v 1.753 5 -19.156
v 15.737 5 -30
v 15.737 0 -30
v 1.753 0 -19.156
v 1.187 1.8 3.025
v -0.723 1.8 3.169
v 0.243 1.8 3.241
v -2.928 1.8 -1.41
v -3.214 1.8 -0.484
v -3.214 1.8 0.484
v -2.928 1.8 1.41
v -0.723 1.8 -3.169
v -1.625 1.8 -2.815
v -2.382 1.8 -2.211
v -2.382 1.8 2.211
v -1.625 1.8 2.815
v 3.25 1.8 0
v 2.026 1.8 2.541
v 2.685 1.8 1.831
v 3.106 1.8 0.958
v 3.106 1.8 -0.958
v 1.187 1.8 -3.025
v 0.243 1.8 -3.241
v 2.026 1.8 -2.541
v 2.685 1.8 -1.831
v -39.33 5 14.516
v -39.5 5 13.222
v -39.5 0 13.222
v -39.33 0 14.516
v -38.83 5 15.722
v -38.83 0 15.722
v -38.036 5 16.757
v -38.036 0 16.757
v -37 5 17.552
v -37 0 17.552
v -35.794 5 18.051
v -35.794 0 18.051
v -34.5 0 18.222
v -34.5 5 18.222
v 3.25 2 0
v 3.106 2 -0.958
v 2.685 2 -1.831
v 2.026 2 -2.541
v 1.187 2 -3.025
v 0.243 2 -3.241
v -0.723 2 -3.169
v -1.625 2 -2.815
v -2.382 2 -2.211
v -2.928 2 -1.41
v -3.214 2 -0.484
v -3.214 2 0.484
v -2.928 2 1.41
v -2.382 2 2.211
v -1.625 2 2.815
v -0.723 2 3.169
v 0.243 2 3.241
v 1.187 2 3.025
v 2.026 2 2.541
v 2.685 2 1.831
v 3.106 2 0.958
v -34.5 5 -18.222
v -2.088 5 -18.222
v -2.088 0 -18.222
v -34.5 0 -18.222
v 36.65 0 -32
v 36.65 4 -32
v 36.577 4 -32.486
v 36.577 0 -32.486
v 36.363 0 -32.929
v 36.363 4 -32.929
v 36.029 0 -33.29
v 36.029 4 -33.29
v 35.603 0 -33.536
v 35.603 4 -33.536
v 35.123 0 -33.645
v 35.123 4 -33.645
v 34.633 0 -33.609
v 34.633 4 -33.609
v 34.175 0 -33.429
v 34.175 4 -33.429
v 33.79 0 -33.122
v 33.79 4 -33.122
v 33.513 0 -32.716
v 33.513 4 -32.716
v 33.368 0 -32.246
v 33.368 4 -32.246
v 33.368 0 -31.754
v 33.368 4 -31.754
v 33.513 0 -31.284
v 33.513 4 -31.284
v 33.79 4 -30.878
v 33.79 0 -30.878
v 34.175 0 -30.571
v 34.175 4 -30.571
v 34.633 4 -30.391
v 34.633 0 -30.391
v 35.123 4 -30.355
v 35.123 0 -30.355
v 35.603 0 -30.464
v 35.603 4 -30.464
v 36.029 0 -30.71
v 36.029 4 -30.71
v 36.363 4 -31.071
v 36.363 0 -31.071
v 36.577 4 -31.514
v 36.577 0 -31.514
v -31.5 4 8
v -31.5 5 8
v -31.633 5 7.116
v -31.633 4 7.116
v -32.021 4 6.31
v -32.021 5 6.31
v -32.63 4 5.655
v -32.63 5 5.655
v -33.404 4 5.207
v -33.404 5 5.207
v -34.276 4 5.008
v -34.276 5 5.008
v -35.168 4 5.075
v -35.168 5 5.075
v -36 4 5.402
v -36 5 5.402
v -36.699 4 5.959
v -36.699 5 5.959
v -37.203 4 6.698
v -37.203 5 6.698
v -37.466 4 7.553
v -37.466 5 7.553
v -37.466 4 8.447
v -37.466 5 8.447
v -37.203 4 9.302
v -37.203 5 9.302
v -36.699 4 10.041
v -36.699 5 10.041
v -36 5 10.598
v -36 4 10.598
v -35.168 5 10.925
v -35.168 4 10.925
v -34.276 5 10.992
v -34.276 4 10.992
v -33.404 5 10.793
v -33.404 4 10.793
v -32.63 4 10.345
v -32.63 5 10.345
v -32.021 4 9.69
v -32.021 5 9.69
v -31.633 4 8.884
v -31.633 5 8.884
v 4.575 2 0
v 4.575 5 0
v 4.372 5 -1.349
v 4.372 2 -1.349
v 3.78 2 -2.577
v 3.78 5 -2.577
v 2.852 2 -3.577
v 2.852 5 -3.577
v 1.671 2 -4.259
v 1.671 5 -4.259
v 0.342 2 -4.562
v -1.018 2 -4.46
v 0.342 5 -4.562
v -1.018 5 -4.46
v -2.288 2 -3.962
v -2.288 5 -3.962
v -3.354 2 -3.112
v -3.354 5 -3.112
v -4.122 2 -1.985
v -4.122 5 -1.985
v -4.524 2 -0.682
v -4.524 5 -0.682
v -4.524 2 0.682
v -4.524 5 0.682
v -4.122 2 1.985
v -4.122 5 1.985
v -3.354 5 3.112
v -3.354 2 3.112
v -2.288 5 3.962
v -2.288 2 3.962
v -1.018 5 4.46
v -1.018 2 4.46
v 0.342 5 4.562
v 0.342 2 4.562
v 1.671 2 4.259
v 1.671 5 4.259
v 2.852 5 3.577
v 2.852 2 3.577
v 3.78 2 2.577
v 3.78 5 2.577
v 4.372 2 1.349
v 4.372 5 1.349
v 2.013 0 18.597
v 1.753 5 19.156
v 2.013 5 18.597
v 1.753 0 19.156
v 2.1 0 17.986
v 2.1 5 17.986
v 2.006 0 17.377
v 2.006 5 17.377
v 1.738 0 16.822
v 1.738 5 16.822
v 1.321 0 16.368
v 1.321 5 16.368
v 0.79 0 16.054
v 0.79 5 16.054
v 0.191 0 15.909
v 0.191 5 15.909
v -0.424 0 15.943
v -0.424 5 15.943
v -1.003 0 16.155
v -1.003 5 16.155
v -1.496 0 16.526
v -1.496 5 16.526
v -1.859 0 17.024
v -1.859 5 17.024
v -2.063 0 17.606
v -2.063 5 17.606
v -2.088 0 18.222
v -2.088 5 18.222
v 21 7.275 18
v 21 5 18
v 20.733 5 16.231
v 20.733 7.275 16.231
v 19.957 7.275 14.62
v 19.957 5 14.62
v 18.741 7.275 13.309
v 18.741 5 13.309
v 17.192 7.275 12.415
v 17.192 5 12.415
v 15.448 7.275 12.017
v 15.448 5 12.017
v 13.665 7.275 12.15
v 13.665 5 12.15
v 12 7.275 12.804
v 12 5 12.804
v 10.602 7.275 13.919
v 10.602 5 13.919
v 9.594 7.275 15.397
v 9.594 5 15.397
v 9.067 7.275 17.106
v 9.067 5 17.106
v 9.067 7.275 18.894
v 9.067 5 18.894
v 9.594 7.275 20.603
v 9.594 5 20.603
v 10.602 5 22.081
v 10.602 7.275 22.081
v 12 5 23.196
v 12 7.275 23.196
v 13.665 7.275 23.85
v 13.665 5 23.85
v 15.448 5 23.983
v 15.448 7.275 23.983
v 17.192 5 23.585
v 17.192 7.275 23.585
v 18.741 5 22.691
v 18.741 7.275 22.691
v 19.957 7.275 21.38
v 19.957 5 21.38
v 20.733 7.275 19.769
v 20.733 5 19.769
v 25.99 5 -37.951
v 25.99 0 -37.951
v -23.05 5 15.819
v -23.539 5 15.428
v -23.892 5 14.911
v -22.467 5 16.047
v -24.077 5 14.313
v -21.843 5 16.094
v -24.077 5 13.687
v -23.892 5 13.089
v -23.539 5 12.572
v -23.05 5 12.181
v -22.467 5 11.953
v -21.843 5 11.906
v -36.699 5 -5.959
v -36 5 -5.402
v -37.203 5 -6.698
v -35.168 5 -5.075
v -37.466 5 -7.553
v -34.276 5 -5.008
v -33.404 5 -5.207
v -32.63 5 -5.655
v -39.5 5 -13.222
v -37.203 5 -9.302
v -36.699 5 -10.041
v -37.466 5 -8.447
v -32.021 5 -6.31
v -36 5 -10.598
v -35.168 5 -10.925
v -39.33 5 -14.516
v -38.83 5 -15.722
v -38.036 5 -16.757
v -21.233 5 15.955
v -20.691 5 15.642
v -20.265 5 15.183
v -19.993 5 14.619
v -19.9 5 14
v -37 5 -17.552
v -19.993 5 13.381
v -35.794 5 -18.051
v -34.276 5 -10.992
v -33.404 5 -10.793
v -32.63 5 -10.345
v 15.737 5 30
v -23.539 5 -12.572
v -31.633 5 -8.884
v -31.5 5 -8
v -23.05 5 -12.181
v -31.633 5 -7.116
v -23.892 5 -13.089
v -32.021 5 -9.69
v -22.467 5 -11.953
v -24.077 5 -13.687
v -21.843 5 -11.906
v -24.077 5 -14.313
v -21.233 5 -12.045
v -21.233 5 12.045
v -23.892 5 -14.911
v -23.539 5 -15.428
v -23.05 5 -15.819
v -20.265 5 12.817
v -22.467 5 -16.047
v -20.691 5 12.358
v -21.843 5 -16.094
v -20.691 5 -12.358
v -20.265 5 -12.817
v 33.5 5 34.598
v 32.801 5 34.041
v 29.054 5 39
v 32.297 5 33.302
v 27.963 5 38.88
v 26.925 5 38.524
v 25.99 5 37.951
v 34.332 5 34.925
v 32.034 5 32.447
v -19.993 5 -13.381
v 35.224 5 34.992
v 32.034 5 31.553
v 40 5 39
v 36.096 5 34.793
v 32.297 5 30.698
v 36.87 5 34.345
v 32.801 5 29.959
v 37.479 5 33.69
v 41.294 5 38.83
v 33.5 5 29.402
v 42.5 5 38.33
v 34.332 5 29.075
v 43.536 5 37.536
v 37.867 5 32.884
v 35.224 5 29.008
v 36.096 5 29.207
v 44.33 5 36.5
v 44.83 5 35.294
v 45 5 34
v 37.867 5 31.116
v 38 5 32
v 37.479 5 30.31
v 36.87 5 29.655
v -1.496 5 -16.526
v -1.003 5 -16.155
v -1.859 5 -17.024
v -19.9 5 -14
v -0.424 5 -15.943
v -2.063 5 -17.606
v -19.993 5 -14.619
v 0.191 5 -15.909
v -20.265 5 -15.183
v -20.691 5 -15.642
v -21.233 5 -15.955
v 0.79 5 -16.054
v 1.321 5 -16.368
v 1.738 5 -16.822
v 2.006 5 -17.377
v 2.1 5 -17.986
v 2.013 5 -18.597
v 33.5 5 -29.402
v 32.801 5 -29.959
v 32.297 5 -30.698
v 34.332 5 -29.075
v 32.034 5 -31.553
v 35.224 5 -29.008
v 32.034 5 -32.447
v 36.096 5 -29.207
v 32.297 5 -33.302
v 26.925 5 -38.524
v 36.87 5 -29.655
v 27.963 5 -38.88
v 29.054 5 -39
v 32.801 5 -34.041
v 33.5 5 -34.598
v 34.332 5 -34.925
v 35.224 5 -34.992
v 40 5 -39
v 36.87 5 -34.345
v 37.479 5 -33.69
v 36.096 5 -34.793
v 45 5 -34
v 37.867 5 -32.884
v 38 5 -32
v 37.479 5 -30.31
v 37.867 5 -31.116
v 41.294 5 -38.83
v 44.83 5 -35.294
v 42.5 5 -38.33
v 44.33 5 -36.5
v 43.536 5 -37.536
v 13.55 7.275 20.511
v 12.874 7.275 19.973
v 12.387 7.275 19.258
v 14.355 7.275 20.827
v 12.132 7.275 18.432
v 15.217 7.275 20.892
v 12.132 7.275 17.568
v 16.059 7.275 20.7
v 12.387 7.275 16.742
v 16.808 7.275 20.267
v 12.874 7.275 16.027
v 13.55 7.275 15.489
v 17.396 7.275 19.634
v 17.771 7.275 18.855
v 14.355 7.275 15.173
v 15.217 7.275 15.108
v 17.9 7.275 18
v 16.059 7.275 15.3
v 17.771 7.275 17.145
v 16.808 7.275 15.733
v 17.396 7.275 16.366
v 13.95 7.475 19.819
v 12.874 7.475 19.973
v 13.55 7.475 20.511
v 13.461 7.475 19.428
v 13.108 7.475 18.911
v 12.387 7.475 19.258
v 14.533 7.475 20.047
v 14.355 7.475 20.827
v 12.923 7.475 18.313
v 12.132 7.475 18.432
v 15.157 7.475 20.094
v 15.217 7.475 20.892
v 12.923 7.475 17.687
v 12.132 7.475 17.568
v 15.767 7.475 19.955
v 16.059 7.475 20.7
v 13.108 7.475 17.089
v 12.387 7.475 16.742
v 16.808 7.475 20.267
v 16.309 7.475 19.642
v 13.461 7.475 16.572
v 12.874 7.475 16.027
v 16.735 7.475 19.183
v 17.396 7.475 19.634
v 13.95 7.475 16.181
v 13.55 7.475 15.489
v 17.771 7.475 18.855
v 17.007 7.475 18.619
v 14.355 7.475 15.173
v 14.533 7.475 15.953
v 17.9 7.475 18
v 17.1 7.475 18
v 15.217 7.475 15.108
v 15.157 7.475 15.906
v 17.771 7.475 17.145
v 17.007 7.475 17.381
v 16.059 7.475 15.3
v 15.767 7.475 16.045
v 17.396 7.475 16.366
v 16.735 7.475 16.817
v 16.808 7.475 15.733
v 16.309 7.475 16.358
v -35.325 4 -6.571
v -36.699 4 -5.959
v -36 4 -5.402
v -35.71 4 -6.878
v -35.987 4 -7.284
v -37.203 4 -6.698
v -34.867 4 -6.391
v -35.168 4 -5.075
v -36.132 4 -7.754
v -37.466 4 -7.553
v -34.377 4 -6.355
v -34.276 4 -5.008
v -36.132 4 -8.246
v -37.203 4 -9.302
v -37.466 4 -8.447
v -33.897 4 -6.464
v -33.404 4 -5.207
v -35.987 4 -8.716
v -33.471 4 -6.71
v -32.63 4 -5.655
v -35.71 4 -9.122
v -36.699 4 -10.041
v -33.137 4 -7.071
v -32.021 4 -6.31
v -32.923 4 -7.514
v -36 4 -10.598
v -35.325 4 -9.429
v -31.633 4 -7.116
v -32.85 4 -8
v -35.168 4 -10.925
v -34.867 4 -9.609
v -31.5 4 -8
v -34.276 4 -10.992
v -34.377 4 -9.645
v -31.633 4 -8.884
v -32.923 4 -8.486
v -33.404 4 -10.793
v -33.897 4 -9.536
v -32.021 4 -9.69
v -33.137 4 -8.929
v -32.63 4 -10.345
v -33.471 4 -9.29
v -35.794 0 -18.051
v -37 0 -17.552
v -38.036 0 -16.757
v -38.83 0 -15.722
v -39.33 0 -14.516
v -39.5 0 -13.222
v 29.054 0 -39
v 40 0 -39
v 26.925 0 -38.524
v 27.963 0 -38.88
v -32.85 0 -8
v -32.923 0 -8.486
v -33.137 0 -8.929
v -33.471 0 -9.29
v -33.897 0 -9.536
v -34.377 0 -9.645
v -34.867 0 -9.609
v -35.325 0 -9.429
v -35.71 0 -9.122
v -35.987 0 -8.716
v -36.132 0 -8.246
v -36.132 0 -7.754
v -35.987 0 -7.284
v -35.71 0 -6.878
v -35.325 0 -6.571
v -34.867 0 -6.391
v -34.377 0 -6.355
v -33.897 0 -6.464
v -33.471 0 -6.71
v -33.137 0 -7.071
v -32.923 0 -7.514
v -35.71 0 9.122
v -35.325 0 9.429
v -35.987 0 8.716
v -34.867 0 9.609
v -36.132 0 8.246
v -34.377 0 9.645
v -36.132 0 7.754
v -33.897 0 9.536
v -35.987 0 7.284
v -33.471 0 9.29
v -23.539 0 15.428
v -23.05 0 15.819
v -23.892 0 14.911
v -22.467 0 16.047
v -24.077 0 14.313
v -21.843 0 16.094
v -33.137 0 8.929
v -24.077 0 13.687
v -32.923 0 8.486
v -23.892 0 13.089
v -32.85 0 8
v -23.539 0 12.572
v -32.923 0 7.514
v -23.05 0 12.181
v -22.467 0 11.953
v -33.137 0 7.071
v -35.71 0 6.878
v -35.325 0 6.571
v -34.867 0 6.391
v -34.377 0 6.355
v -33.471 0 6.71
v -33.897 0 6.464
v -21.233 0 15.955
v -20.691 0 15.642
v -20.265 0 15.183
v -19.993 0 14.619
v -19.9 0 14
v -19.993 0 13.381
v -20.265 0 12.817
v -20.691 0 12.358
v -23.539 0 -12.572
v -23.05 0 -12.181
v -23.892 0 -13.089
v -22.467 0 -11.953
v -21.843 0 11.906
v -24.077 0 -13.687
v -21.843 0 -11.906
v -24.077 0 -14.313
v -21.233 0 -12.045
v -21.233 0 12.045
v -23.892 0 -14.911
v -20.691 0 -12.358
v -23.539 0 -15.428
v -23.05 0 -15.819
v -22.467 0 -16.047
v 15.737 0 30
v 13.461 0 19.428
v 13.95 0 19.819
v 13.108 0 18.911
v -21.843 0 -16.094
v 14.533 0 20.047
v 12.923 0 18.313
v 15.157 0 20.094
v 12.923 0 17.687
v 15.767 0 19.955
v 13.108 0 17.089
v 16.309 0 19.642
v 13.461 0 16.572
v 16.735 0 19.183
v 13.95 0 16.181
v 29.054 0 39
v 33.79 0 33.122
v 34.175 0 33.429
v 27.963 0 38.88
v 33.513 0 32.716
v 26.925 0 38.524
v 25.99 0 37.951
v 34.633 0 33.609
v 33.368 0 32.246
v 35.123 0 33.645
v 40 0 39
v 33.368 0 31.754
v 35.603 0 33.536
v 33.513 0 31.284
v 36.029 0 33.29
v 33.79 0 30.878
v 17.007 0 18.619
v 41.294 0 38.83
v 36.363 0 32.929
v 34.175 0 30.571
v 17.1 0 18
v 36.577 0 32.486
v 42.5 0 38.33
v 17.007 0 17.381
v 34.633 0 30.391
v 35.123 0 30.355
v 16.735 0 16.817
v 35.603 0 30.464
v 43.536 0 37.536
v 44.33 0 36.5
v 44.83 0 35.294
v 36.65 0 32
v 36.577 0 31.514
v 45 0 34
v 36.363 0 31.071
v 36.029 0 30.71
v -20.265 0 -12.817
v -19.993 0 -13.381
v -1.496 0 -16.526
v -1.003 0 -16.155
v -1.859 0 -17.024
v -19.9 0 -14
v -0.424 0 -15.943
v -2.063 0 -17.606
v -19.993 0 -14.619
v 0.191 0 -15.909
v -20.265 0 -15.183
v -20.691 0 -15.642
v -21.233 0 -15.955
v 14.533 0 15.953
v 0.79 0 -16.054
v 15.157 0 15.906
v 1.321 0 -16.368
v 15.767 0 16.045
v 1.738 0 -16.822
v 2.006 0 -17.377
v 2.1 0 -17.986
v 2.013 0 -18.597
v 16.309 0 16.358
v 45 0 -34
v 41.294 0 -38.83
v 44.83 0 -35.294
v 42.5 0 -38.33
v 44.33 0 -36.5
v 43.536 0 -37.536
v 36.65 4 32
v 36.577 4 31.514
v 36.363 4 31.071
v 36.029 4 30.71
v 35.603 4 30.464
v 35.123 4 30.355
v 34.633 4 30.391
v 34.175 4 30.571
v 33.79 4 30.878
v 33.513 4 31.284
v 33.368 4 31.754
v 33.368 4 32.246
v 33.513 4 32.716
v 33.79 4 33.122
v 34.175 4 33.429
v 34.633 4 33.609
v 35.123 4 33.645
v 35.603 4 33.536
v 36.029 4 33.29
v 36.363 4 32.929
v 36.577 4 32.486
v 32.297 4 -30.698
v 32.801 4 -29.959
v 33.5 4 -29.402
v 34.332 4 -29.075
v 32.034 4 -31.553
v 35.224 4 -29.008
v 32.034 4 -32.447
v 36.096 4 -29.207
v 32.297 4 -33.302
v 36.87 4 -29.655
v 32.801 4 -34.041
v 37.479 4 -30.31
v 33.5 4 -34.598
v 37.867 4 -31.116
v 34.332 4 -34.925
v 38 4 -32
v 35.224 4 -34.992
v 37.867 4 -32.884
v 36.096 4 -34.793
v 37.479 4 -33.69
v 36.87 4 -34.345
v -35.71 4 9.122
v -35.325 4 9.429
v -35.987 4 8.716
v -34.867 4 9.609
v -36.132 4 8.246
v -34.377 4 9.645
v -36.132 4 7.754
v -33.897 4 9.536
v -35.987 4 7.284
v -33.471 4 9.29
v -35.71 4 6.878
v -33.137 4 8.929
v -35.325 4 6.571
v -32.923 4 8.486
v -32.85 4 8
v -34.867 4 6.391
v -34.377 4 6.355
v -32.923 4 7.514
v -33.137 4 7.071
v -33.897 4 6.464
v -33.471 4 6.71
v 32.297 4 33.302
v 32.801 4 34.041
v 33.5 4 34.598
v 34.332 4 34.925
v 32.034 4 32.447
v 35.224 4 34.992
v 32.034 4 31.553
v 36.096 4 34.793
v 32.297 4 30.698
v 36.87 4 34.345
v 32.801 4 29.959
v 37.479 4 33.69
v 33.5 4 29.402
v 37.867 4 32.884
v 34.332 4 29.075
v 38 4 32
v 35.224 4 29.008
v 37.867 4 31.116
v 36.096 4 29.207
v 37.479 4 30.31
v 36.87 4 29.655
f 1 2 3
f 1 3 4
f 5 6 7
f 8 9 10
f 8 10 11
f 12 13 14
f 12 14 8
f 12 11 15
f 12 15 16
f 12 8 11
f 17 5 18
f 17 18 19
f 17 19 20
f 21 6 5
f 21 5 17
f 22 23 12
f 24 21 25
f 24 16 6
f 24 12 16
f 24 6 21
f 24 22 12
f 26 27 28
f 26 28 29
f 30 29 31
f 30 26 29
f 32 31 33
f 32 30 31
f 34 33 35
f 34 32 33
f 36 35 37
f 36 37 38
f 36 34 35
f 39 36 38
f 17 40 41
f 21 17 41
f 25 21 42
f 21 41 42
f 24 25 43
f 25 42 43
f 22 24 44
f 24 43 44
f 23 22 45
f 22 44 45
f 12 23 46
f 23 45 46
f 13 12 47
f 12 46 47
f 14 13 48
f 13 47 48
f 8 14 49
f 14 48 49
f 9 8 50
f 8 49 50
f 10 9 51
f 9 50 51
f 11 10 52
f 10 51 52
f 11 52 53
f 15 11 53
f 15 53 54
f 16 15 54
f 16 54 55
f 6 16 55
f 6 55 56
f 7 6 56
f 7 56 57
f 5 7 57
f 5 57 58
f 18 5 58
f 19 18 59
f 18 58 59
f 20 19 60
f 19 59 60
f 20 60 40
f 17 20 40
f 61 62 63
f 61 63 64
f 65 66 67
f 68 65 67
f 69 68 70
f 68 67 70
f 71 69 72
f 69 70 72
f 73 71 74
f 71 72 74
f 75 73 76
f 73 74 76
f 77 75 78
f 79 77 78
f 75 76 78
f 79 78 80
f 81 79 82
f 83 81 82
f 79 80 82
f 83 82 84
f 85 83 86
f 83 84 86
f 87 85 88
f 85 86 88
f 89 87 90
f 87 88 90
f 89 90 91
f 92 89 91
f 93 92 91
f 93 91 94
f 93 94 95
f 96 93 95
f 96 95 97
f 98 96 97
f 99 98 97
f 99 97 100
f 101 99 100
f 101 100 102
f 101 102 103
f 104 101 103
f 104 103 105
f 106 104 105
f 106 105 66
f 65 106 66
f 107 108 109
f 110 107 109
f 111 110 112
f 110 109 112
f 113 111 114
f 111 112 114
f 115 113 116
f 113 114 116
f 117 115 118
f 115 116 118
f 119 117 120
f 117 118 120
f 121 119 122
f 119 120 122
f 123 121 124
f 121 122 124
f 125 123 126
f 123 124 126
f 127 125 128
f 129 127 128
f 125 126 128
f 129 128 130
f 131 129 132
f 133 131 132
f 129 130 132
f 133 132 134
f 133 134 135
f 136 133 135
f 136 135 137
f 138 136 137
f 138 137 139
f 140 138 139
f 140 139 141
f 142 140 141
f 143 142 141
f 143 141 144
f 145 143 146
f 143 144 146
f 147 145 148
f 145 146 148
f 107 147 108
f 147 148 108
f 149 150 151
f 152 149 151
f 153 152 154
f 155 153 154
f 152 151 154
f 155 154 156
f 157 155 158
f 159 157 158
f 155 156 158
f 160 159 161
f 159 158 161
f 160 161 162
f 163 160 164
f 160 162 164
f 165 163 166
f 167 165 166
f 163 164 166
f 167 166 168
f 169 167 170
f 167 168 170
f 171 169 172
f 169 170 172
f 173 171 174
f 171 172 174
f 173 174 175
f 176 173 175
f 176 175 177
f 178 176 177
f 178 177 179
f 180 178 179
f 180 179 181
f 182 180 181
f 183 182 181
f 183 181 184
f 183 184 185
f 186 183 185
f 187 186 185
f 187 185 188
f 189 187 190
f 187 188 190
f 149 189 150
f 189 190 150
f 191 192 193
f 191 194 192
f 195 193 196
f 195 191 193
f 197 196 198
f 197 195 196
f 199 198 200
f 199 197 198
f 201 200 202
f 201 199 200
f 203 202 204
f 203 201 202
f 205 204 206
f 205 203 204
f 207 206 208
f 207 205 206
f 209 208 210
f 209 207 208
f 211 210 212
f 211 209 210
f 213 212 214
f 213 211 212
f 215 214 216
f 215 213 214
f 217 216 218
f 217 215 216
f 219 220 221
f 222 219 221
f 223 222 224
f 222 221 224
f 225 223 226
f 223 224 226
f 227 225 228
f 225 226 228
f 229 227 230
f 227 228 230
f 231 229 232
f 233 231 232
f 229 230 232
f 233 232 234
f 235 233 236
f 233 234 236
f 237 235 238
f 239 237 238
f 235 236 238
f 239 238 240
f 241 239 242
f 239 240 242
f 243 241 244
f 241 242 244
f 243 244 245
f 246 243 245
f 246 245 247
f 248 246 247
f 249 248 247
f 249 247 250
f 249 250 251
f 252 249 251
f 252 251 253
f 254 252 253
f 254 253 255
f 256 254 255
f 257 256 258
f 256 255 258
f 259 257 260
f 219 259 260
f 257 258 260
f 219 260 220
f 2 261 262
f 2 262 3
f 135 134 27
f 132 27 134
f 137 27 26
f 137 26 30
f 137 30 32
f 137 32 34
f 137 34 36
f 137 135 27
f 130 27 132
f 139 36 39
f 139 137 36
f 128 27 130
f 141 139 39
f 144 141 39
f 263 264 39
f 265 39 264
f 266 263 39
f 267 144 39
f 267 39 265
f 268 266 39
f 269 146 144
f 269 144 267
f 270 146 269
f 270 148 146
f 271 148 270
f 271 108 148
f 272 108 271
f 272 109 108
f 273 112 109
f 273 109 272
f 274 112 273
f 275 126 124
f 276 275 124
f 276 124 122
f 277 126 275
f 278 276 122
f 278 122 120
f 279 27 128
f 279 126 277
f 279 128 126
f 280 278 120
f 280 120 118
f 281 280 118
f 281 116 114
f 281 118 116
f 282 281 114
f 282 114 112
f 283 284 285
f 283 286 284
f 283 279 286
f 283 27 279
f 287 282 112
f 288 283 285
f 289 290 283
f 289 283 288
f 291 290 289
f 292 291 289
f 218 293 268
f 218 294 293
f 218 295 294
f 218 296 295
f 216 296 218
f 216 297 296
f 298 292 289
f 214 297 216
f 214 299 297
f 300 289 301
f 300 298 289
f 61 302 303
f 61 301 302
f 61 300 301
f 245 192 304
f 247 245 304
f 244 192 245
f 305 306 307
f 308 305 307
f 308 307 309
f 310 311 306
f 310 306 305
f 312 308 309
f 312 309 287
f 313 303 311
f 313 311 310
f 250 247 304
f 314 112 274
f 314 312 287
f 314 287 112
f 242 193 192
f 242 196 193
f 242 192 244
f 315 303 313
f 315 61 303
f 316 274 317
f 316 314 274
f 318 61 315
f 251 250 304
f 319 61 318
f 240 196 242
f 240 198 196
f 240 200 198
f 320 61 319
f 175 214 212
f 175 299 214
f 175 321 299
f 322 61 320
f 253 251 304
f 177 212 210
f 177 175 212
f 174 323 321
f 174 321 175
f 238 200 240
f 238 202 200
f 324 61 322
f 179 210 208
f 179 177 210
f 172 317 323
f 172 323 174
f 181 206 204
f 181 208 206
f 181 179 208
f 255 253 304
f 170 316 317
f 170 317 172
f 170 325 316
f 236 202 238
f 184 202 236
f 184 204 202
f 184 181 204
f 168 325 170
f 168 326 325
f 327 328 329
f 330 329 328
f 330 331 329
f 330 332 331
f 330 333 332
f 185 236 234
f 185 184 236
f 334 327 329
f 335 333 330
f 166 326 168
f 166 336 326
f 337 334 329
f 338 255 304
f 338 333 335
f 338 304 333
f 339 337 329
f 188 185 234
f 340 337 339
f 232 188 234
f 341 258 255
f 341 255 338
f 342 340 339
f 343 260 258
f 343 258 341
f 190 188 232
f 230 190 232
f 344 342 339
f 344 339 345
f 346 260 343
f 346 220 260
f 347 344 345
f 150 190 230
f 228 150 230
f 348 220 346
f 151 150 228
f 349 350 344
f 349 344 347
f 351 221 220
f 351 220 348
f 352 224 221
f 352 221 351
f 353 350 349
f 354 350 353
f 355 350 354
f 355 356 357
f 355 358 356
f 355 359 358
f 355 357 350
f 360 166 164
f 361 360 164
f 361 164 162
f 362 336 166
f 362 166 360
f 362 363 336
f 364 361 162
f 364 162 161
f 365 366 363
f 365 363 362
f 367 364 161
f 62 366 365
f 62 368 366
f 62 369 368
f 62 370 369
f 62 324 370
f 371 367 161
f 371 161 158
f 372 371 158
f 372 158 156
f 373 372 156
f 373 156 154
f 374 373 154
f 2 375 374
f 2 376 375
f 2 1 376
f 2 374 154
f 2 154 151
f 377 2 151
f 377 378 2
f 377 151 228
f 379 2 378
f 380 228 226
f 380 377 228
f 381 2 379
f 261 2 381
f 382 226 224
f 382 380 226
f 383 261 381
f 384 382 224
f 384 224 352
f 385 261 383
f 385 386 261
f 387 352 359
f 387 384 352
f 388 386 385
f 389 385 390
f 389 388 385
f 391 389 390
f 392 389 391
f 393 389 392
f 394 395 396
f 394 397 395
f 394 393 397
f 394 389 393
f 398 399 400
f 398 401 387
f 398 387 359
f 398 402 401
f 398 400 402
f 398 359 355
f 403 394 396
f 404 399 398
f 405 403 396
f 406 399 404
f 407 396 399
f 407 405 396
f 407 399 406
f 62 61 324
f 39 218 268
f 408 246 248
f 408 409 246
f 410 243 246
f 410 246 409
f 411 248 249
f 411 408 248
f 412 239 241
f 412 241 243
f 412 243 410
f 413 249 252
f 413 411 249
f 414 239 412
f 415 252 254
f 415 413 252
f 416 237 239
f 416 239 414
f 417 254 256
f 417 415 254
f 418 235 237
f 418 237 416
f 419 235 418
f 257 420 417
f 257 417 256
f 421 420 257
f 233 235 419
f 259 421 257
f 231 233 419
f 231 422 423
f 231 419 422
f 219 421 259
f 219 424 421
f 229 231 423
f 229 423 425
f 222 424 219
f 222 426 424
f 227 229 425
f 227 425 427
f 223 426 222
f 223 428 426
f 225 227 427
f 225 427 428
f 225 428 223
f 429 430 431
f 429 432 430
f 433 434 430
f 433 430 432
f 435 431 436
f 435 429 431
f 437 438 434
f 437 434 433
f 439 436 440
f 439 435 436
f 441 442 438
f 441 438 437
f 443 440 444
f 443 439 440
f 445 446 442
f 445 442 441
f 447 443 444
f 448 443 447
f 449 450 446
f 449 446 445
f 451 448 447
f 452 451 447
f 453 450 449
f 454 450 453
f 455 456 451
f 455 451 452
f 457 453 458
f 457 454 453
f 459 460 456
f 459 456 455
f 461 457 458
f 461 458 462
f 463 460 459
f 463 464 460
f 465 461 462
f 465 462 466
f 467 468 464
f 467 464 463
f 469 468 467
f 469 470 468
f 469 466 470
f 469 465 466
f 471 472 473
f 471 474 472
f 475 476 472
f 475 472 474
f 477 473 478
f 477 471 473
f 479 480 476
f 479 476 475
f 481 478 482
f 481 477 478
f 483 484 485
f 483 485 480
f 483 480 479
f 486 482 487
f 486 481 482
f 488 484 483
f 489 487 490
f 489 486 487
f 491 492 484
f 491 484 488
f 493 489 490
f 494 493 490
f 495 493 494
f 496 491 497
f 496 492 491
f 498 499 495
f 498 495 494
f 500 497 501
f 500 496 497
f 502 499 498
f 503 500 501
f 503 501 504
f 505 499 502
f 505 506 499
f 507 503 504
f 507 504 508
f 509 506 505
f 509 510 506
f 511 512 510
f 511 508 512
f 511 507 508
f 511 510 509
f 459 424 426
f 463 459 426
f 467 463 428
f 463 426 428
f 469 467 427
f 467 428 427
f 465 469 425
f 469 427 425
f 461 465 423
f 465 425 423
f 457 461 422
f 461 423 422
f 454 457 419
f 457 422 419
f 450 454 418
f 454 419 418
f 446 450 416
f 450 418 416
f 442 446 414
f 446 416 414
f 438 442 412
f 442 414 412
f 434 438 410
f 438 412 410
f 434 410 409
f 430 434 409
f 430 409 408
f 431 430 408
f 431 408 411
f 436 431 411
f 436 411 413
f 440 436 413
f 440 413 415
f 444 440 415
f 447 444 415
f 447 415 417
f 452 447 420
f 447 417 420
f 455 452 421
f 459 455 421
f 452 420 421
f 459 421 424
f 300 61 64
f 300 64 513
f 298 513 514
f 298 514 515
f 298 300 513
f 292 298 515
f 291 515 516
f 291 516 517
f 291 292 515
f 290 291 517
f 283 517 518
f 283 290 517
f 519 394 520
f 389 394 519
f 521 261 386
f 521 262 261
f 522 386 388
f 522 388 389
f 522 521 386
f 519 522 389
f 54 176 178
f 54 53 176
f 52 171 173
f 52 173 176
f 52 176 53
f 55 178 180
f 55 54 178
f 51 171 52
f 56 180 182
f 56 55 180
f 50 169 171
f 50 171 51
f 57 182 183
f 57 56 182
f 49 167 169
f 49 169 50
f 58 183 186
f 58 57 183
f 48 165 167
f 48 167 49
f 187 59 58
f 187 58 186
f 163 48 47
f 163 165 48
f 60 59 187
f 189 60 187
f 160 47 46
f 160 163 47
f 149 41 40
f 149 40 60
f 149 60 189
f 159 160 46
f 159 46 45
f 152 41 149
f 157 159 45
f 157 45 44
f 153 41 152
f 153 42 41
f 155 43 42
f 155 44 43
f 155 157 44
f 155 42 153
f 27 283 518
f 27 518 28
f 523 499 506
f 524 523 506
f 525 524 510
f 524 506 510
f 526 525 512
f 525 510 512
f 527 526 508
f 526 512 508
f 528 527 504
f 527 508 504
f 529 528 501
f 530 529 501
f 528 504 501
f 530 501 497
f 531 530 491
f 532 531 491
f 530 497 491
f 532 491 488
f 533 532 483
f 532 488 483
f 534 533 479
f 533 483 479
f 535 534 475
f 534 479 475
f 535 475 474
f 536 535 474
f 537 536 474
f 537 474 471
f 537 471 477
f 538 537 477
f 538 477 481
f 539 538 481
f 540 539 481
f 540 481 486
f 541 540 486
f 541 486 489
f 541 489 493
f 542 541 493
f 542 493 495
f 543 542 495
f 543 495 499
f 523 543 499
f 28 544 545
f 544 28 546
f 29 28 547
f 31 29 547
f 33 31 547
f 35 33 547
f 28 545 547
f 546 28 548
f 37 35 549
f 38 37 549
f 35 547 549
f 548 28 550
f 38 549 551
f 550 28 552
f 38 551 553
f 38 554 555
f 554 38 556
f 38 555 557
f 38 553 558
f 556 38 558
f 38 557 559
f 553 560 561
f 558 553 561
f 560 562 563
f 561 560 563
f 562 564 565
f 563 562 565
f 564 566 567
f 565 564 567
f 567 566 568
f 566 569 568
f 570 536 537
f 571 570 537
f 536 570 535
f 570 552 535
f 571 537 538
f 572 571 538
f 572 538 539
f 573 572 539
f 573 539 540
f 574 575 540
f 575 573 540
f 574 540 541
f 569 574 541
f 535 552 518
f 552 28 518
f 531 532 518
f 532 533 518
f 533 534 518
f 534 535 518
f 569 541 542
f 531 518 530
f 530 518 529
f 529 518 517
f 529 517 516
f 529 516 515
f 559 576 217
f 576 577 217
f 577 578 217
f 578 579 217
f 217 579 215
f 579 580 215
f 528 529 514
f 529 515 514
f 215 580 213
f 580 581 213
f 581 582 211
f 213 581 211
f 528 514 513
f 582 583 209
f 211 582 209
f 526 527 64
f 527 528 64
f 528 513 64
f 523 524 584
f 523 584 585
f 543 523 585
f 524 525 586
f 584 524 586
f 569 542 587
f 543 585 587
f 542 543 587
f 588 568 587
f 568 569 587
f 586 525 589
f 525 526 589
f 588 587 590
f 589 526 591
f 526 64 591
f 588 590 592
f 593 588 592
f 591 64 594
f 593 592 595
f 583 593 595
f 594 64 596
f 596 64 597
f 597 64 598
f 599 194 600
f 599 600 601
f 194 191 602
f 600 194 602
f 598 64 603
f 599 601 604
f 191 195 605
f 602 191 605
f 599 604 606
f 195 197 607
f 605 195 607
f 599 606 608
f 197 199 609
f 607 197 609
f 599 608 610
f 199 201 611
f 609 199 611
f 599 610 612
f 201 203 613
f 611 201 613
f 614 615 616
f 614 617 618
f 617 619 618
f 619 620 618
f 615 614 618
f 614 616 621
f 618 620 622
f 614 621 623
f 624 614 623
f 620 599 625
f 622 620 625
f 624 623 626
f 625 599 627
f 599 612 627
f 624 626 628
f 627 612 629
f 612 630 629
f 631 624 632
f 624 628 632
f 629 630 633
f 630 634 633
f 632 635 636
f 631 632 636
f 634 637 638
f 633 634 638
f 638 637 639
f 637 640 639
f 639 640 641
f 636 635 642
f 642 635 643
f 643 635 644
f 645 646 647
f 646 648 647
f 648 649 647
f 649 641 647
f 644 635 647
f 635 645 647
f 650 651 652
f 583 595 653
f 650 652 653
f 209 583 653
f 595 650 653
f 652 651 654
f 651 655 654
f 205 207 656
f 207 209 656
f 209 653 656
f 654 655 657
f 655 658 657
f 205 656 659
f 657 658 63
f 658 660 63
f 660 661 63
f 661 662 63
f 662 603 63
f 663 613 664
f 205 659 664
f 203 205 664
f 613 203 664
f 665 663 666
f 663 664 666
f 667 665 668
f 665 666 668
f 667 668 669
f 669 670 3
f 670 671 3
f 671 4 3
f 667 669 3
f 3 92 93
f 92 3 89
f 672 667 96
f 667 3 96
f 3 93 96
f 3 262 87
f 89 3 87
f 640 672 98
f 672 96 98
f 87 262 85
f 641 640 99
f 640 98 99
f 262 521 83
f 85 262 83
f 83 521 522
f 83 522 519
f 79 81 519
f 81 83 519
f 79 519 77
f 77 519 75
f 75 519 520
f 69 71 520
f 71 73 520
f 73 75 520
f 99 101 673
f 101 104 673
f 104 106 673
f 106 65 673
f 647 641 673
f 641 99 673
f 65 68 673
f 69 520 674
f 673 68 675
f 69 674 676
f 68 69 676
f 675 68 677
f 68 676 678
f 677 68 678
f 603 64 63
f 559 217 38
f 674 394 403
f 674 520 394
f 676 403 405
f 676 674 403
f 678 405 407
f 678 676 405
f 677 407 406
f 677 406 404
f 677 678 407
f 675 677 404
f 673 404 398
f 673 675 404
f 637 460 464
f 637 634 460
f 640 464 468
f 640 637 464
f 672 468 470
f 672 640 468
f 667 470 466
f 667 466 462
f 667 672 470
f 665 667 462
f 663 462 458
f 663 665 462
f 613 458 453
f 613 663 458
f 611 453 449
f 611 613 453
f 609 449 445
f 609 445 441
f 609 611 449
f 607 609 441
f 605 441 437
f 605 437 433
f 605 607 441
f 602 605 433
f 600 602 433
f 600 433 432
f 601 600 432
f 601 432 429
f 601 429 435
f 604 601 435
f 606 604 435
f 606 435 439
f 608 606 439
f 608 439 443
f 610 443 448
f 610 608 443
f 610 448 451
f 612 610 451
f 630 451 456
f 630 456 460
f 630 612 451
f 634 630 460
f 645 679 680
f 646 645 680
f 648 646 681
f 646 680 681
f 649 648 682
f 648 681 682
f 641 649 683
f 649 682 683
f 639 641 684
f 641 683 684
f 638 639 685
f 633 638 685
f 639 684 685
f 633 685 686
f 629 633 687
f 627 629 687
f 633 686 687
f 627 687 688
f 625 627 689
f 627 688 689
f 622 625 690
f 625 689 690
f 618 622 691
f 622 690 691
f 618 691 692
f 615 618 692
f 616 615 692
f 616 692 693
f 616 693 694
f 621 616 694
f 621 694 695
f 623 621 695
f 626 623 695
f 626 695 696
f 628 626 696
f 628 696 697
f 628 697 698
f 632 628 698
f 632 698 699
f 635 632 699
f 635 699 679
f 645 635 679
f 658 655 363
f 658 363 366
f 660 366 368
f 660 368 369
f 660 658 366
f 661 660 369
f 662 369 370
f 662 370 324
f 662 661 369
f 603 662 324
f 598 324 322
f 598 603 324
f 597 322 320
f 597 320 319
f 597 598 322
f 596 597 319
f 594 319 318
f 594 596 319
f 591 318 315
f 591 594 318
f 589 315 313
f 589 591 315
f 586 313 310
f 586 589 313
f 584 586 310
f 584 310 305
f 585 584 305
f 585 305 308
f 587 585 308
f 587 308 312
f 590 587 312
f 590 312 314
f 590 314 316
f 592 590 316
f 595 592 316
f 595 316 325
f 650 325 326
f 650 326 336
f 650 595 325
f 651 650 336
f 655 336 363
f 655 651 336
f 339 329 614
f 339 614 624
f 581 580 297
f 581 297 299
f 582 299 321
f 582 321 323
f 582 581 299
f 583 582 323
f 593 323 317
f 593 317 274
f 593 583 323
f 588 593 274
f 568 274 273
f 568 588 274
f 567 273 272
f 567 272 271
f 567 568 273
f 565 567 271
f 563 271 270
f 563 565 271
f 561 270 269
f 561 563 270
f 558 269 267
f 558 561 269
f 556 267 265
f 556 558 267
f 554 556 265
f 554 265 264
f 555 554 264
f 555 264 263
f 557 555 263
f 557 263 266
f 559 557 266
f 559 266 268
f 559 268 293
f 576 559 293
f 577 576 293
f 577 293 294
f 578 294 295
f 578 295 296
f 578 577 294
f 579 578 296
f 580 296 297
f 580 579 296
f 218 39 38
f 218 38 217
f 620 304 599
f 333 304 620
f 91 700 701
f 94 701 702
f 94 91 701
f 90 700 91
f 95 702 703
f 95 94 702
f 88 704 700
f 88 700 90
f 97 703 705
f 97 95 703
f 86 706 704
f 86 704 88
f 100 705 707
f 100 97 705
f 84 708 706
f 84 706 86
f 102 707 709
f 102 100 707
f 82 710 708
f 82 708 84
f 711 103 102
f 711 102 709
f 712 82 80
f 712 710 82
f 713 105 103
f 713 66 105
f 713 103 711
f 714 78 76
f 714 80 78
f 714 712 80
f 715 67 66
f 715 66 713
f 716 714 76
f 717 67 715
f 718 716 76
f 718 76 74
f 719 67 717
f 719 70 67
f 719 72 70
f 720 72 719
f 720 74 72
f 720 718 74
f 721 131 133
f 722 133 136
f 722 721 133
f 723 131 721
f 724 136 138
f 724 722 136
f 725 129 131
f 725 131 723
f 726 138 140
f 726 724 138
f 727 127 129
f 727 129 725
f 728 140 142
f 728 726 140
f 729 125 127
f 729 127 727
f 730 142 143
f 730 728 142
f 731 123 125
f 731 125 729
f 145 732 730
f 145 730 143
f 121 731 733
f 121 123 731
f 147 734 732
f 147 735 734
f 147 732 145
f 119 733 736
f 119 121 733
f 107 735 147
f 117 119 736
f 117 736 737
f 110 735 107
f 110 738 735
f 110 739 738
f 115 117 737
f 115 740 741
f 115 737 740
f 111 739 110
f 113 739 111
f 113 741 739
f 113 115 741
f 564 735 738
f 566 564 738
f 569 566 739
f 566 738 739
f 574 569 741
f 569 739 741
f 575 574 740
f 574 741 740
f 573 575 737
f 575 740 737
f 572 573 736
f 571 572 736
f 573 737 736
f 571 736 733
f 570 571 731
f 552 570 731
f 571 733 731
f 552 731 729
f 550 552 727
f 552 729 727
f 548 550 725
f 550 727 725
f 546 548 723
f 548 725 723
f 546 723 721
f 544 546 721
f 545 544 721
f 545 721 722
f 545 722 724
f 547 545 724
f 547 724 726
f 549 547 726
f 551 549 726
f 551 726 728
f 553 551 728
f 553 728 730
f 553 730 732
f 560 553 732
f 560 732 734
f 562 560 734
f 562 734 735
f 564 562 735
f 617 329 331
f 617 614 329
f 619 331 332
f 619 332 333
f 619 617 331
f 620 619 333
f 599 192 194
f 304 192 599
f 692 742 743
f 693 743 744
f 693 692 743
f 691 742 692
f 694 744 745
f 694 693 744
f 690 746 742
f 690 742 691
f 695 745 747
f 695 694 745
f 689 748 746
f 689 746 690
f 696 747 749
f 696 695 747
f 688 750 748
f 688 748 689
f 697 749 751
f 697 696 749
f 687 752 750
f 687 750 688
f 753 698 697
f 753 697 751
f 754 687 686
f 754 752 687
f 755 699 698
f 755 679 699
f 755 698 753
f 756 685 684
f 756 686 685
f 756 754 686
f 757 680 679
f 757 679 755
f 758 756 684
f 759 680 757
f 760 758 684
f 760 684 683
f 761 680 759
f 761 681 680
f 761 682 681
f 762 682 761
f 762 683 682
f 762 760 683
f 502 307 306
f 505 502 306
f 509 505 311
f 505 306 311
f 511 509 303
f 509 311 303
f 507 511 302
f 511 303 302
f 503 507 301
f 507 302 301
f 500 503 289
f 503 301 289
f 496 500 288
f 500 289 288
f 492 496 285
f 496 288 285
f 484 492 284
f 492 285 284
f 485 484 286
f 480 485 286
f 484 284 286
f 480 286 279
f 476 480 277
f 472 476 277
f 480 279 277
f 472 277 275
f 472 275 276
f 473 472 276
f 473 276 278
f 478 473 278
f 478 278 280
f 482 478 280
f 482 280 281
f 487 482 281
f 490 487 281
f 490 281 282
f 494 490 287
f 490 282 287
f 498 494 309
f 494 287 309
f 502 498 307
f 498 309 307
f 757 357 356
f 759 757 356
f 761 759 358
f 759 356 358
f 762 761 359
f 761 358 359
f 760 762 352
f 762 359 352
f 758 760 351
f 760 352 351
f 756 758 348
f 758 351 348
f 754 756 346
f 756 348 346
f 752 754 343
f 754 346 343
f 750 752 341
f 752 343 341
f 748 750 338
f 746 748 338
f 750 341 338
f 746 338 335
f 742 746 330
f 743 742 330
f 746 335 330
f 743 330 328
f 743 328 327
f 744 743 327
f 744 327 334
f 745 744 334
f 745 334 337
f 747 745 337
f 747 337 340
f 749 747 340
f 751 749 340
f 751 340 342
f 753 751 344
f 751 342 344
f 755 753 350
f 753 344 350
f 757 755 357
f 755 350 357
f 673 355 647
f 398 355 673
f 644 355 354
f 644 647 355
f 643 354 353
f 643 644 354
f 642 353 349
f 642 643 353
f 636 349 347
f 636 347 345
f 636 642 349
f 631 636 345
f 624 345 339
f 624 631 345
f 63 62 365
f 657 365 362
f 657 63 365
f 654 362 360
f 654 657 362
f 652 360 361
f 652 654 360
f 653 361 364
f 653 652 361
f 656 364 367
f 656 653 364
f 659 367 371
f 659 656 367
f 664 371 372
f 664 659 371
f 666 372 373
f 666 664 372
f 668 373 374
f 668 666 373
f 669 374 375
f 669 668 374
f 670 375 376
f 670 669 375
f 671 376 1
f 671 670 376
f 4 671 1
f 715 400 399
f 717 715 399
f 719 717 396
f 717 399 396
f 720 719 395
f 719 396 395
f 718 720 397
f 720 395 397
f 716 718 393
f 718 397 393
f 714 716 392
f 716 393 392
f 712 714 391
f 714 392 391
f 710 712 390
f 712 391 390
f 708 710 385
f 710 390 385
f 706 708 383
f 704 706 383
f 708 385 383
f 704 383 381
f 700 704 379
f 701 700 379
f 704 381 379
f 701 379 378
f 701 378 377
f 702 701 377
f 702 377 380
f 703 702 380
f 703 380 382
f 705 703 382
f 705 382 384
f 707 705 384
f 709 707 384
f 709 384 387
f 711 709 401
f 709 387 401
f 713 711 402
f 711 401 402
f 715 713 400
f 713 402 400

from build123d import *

# Parameters (mm, degrees)
SKETCH1_W           = 115
SKETCH1_H           = 60
SKETCH1_R           = 2.1
BOSS_EXTRUDE1_DEPTH = 5
SKETCH2_R           = 4.575
CUT_EXTRUDE1_DEPTH  = 3
SKETCH3_R           = 3.25
CUT_EXTRUDE2_DEPTH  = 0.2
SKETCH4_R           = 1.65
CUT_EXTRUDE3_DEPTH  = 6
CUT_EXTRUDE4_DEPTH  = 6
BOSS_EXTRUDE2_DEPTH = 5
SKETCH8_R           = 1.65
CUT_EXTRUDE5_DEPTH  = 6
FILLET1_R           = 5
SKETCH9_R           = 6
SKETCH9_R_2         = 2.1
BOSS_EXTRUDE3_DEPTH = 2.275
SKETCH10_R          = 2.9
SKETCH10_R_2        = 2.1
BOSS_EXTRUDE4_DEPTH = 0.2
SKETCH11_R          = 3
CUT_EXTRUDE6_DEPTH  = 1


with BuildPart() as part:
    # Sketch1 → Boss-Extrude1 (new body)
    with BuildSketch(Plane(origin=(0, 0, 0), x_dir=(1, 0, 0), z_dir=(0, 1, 0))):
        with Locations((-12.5, 0)):
            Rectangle(SKETCH1_W, SKETCH1_H)
        with Locations((-22, 14)):
            Circle(SKETCH1_R, mode=Mode.SUBTRACT)
        with Locations((0, 18)):
            Circle(SKETCH1_R, mode=Mode.SUBTRACT)
        with Locations((0, -18)):
            Circle(SKETCH1_R, mode=Mode.SUBTRACT)
        with Locations((-22, -14)):
            Circle(SKETCH1_R, mode=Mode.SUBTRACT)
        with Locations((15, -18)):
            Circle(SKETCH1_R, mode=Mode.SUBTRACT)
    extrude(amount=BOSS_EXTRUDE1_DEPTH)

    # Sketch2 → Cut-Extrude1 (cut)
    with BuildSketch(Plane(origin=(0, 5, 0), x_dir=(1, 0, 0), z_dir=(0, 1, 0))):
        Circle(SKETCH2_R)
    extrude(amount=-CUT_EXTRUDE1_DEPTH, mode=Mode.SUBTRACT)

    # Sketch3 → Cut-Extrude2 (cut)
    with BuildSketch(Plane(origin=(0, 2, 0), x_dir=(1, 0, 0), z_dir=(0, 1, 0))):
        Circle(SKETCH3_R)
    extrude(amount=-CUT_EXTRUDE2_DEPTH, mode=Mode.SUBTRACT)

    # Sketch4 → Cut-Extrude3 (cut, through all)
    with BuildSketch(Plane(origin=(0, 5, 0), x_dir=(1, 0, 0), z_dir=(0, 1, 0))):
        with Locations((-34.5, -8)):
            Circle(SKETCH4_R)
        with Locations((-34.5, 8)):
            Circle(SKETCH4_R)
    extrude(amount=-CUT_EXTRUDE3_DEPTH, mode=Mode.SUBTRACT)

    # Sketch6 → Cut-Extrude4 (cut, through all)
    with BuildSketch(Plane(origin=(0, 5, 0), x_dir=(1, 0, 0), z_dir=(0, 1, 0))):
        with BuildLine():
            Line((-22, 18.221576202), (-34.5, 18.221576202))
            ThreePointArc((-34.5, 18.221576202), (-38.035533906, 16.757110108), (-39.5, 13.221576202))
            Line((-39.5, 13.221576202), (-39.5, -13.221576202))
            ThreePointArc((-39.5, -13.221576202), (-38.035533906, -16.757110108), (-34.5, -18.221576202))
            Line((-34.5, -18.221576202), (-22, -18.221576202))
            Line((-22, -18.221576202), (-8.297519941, -18.221576202))
            Line((-8.297519941, -18.221576202), (0.548980681, -18.221576202))
            Line((0.548980681, -18.221576202), (26.801199277, -38.580439602))
            Line((26.801199277, -38.580439602), (-22, -30))
            Line((-22, -30), (-70, -30))
            Line((-70, -30), (-70, 30))
            Line((-70, 30), (-22, 30))
            Line((-22, 30), (26.801199277, 38.580439602))
            Line((26.801199277, 38.580439602), (0.548980681, 18.221576202))
            Line((0.548980681, 18.221576202), (-8.297519941, 18.221576202))
            Line((-8.297519941, 18.221576202), (-22, 18.221576202))
        make_face()
    extrude(amount=-CUT_EXTRUDE4_DEPTH, mode=Mode.SUBTRACT)

    # Sketch7 → Boss-Extrude2 (add)
    with BuildSketch(Plane(origin=(0, 5, 0), x_dir=(1, 0, 0), z_dir=(0, 1, 0))):
        Polygon((27.342211368, 39), (15.73694821, 30), (45, 30), (45, 39), align=None)
        Polygon((45, -30), (15.73694821, -30), (27.342211368, -39), (45, -39), align=None)
    extrude(amount=-BOSS_EXTRUDE2_DEPTH)

    # Sketch8 → Cut-Extrude5 (cut, through all)
    with BuildSketch(Plane(origin=(0, 5, 0), x_dir=(1, 0, 0), z_dir=(0, 1, 0))):
        with Locations((35, 32)):
            Circle(SKETCH8_R)
        with Locations((35, -32)):
            Circle(SKETCH8_R)
    extrude(amount=-CUT_EXTRUDE5_DEPTH, mode=Mode.SUBTRACT)

    # Fillet1
    fillet1_edges = [part.edges().sort_by_distance(p)[0] for p in [
        (45, 2.5, -39),
        (27.342211368, 2.5, -39),
        (27.342211368, 2.5, 39),
        (45, 2.5, 39),
    ]]
    fillet(fillet1_edges, radius=FILLET1_R)

    # Sketch9 → Boss-Extrude3 (add)
    with BuildSketch(Plane(origin=(0, 5, 0), x_dir=(1, 0, 0), z_dir=(0, 1, 0))):
        with Locations((15, -18)):
            Circle(SKETCH9_R)
        with Locations((15, -18)):
            Circle(SKETCH9_R_2, mode=Mode.SUBTRACT)
    extrude(amount=BOSS_EXTRUDE3_DEPTH)

    # Sketch10 → Boss-Extrude4 (add)
    with BuildSketch(Plane(origin=(0, 7.275, 0), x_dir=(1, 0, 0), z_dir=(0, 1, 0))):
        with Locations((15, -18)):
            Circle(SKETCH10_R)
        with Locations((15, -18)):
            Circle(SKETCH10_R_2, mode=Mode.SUBTRACT)
    extrude(amount=BOSS_EXTRUDE4_DEPTH)

    # Sketch11 → Cut-Extrude6 (cut)
    with BuildSketch(Plane(origin=(0, 5, 0), x_dir=(1, 0, 0), z_dir=(0, 1, 0))):
        with Locations((-34.5, 8)):
            Circle(SKETCH11_R)
        with Locations((-34.5, -8)):
            Circle(SKETCH11_R)
        with Locations((35, -32)):
            Circle(SKETCH11_R)
        with Locations((35, 32)):
            Circle(SKETCH11_R)
    extrude(amount=-CUT_EXTRUDE6_DEPTH, mode=Mode.SUBTRACT)


solid = part.part
